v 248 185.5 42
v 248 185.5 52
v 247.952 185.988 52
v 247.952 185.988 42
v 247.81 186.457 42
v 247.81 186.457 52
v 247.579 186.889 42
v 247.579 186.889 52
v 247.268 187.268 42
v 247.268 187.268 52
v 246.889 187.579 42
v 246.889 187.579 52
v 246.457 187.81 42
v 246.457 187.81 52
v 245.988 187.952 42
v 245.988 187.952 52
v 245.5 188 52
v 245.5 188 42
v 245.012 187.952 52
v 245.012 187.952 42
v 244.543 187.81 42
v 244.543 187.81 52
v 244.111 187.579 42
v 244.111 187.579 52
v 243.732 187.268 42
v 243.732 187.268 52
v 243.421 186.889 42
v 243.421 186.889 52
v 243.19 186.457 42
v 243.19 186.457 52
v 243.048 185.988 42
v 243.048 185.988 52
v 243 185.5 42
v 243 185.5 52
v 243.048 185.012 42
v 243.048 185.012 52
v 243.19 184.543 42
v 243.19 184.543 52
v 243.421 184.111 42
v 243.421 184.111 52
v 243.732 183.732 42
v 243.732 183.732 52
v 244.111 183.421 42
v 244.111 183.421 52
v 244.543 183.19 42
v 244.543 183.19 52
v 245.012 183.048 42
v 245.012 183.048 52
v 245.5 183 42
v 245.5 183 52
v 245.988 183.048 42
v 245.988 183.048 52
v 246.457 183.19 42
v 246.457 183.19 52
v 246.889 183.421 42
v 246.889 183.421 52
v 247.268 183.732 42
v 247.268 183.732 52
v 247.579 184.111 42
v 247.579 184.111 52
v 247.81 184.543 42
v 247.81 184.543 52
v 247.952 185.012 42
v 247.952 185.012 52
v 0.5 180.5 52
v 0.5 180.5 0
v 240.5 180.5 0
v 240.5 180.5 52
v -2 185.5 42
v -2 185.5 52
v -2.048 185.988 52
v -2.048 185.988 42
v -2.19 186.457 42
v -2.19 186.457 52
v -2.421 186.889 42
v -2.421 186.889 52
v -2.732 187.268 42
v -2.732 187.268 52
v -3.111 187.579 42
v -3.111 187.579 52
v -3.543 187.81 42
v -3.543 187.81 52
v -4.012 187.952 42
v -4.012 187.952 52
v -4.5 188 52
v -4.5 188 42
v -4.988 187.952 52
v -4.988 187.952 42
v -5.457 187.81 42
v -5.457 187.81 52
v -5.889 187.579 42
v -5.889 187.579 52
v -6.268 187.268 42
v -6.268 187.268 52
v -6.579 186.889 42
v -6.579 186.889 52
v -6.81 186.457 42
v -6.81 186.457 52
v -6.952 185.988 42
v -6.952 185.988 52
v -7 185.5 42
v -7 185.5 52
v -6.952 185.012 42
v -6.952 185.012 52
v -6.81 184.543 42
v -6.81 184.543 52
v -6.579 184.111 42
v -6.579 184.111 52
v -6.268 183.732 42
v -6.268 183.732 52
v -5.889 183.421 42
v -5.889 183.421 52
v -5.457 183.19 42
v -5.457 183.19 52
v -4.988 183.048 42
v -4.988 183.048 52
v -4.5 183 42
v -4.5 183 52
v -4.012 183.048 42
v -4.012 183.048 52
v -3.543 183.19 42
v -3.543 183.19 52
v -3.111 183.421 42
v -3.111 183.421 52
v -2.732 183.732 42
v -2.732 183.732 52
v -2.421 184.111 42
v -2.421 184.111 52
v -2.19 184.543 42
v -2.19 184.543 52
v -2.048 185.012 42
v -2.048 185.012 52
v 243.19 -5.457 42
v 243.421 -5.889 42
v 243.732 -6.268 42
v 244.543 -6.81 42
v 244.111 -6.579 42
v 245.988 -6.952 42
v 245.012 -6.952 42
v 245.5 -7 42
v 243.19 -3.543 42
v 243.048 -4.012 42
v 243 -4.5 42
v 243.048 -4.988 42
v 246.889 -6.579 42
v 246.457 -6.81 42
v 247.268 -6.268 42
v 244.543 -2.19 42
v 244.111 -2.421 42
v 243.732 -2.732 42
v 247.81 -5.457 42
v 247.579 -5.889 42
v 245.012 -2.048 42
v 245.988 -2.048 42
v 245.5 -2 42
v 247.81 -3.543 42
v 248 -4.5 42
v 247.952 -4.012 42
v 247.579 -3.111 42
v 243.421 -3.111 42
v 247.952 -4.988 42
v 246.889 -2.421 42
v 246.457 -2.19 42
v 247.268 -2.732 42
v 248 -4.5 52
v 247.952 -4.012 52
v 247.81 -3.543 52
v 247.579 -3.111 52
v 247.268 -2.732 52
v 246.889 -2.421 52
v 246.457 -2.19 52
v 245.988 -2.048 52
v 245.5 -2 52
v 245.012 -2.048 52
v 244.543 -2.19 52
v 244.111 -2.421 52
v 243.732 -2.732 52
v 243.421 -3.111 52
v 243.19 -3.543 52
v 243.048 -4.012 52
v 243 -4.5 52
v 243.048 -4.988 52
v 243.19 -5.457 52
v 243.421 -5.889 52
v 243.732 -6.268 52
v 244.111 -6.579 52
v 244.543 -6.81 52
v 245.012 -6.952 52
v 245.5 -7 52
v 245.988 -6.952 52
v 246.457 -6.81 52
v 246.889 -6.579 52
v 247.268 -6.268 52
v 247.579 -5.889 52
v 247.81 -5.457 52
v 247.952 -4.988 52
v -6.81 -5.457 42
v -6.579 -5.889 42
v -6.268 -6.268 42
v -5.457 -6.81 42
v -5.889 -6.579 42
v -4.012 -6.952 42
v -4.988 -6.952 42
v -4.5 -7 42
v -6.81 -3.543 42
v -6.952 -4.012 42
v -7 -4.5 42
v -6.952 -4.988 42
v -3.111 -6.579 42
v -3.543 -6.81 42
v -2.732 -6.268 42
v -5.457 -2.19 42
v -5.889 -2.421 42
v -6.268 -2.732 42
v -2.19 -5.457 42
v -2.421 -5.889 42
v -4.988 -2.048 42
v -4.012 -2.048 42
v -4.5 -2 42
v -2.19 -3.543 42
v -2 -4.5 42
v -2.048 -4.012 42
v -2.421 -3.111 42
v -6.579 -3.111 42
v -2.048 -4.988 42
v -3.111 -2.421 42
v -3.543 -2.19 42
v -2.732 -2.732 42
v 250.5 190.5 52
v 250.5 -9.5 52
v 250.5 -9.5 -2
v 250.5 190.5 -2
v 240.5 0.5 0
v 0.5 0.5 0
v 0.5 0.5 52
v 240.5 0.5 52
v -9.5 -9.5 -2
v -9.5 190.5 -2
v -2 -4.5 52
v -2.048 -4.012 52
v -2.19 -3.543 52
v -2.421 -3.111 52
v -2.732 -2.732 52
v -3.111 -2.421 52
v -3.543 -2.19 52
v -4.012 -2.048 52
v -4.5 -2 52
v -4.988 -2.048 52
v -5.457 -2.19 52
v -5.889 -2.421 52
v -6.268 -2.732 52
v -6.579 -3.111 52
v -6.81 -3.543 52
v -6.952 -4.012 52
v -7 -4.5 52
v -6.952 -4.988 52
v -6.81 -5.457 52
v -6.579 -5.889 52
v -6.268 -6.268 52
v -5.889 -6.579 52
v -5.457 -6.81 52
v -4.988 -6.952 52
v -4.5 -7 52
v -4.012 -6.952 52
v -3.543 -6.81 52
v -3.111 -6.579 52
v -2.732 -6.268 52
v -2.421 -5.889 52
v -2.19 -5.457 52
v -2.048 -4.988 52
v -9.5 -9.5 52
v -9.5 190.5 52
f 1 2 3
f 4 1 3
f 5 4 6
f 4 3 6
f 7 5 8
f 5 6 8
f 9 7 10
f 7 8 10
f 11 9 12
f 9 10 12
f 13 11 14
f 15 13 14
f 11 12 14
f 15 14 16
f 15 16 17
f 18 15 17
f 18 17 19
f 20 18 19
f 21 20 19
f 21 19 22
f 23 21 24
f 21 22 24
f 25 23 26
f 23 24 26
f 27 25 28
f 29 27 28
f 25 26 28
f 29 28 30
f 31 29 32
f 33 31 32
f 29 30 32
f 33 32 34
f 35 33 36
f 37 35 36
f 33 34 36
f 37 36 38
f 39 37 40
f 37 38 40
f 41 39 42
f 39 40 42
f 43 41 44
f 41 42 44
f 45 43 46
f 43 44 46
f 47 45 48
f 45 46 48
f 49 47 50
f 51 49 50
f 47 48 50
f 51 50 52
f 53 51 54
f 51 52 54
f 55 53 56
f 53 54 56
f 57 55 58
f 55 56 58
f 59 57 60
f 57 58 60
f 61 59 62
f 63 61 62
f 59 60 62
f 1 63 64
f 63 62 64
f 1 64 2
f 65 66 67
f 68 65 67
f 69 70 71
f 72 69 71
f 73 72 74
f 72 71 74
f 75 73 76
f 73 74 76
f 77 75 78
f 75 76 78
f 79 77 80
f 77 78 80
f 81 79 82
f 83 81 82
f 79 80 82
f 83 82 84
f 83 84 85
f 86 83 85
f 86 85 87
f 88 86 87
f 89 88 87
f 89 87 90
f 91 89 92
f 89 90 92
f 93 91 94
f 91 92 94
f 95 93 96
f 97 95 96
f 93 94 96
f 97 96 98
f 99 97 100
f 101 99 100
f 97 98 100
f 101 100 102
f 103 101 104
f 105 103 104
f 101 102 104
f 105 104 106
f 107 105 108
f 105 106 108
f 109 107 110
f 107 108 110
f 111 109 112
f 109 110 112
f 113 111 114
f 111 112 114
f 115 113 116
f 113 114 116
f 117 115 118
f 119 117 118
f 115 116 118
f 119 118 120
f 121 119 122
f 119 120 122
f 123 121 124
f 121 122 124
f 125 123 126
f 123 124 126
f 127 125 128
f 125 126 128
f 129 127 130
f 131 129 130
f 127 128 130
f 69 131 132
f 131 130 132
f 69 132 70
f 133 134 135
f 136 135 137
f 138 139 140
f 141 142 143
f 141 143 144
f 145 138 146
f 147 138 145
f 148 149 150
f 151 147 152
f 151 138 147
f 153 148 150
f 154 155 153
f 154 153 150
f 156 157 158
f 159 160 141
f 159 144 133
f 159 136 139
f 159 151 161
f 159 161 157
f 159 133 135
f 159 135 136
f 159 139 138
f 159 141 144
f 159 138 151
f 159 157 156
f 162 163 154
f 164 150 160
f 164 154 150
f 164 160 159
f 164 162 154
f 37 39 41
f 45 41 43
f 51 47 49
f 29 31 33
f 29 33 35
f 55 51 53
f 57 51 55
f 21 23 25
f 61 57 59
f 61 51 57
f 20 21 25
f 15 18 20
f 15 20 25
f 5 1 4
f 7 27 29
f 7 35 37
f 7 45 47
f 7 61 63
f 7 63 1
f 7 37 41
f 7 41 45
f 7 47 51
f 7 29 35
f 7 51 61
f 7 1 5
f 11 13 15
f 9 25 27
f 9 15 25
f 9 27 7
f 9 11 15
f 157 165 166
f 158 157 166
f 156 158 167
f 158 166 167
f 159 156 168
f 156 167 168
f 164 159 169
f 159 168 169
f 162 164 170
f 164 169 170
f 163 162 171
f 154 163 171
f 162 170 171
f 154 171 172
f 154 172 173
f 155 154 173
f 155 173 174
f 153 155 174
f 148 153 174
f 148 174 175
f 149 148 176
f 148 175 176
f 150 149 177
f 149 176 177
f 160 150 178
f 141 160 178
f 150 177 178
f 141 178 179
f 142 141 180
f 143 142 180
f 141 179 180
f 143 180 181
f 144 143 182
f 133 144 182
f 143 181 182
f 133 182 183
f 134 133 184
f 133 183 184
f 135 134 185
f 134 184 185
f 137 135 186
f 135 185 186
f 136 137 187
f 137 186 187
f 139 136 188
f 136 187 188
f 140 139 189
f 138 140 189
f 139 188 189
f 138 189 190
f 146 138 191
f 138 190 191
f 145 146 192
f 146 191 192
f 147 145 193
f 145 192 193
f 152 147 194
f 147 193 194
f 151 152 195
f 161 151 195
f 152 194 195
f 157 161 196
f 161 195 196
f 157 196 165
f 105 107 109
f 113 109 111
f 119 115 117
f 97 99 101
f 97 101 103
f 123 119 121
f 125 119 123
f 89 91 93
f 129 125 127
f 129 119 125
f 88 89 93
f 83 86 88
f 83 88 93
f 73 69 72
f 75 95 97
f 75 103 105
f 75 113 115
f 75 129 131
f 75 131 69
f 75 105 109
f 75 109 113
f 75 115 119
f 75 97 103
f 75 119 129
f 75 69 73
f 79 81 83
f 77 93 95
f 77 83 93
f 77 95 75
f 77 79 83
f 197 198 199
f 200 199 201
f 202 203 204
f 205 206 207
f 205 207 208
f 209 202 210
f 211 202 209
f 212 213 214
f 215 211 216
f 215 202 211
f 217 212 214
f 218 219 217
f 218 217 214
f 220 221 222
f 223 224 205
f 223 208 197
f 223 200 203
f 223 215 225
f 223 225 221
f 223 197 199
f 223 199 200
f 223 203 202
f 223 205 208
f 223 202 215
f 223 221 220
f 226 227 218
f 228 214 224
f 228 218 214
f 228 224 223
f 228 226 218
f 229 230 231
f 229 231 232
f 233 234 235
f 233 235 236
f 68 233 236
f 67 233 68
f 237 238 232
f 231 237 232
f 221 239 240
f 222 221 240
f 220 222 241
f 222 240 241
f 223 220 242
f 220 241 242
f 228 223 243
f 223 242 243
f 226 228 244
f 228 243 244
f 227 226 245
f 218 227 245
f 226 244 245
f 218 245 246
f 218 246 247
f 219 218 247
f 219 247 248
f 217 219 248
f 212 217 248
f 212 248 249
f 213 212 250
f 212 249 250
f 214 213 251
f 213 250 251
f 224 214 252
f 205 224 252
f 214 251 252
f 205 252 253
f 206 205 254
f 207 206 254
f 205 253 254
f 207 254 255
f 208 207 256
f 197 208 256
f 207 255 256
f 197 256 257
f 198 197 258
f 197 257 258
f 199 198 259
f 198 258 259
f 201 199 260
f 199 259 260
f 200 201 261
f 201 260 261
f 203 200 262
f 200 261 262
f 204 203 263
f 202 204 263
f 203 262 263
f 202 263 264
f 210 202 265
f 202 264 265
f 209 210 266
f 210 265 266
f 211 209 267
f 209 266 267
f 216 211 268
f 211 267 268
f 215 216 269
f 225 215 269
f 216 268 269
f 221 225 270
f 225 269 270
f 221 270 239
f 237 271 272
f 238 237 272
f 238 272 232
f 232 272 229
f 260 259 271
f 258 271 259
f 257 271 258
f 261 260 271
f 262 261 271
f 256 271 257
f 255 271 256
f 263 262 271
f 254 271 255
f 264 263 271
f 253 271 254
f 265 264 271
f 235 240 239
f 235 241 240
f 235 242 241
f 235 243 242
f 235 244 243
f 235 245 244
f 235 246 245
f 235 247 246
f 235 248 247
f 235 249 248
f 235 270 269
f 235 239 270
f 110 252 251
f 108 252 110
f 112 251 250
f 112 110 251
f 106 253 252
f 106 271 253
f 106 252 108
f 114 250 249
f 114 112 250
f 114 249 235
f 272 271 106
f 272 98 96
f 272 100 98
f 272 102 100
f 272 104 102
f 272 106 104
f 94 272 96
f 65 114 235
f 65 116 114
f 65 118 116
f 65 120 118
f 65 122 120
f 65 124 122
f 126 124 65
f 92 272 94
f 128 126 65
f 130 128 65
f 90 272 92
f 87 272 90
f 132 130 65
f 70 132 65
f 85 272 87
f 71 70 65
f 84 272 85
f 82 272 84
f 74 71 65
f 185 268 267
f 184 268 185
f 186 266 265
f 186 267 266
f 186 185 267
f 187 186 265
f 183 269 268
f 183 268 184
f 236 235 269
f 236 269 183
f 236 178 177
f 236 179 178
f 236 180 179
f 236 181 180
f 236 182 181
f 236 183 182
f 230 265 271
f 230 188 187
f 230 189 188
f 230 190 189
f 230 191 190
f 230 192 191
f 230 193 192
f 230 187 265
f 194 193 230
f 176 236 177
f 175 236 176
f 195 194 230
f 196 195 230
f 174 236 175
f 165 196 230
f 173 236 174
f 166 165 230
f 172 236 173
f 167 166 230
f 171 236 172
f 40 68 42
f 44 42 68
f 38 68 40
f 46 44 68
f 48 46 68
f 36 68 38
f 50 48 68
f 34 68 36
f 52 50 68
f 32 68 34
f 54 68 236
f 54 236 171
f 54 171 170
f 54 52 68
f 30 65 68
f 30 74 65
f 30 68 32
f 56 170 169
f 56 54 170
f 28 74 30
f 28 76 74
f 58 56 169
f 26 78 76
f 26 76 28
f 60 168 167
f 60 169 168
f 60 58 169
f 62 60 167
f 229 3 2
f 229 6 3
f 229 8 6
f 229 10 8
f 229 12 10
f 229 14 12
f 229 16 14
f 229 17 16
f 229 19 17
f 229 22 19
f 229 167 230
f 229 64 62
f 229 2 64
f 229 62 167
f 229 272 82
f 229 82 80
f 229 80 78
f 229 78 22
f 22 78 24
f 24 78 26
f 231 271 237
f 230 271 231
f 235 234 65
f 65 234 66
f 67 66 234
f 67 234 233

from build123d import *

# Parameters (mm, degrees)
SKETCH_W     = 260
SKETCH_H     = 200
SKETCH_W_2   = 240
SKETCH_H_2   = 180
PAD_DEPTH    = 52
SKETCH001_W  = 260
SKETCH001_H  = 200
PAD001_DEPTH = 2
SKETCH002_R  = 2.5
POCKET_DEPTH = 10


with BuildPart() as part:
    # Sketch → Pad (new body)
    with BuildSketch(Plane.XY):
        with Locations((120.5, 90.5)):
            Rectangle(SKETCH_W, SKETCH_H)
        with Locations((120.5, 90.5)):
            Rectangle(SKETCH_W_2, SKETCH_H_2, mode=Mode.SUBTRACT)
    extrude(amount=PAD_DEPTH)

    # Sketch001 → Pad001 (join)
    with BuildSketch(Plane.XY):
        with Locations((120.5, 90.5)):
            Rectangle(SKETCH001_W, SKETCH001_H)
    extrude(amount=-PAD001_DEPTH)

    # Sketch002 (on Face3 of Pad001) → Pocket (cut)
    with BuildSketch(Plane.XY.offset(52)):
        with Locations((245.5, 185.5)):
            Circle(SKETCH002_R)
        with Locations((245.5, -4.5)):
            Circle(SKETCH002_R)
        with Locations((-4.5, -4.5)):
            Circle(SKETCH002_R)
        with Locations((-4.5, 185.5)):
            Circle(SKETCH002_R)
    extrude(amount=-POCKET_DEPTH, mode=Mode.SUBTRACT)


solid = part.part
